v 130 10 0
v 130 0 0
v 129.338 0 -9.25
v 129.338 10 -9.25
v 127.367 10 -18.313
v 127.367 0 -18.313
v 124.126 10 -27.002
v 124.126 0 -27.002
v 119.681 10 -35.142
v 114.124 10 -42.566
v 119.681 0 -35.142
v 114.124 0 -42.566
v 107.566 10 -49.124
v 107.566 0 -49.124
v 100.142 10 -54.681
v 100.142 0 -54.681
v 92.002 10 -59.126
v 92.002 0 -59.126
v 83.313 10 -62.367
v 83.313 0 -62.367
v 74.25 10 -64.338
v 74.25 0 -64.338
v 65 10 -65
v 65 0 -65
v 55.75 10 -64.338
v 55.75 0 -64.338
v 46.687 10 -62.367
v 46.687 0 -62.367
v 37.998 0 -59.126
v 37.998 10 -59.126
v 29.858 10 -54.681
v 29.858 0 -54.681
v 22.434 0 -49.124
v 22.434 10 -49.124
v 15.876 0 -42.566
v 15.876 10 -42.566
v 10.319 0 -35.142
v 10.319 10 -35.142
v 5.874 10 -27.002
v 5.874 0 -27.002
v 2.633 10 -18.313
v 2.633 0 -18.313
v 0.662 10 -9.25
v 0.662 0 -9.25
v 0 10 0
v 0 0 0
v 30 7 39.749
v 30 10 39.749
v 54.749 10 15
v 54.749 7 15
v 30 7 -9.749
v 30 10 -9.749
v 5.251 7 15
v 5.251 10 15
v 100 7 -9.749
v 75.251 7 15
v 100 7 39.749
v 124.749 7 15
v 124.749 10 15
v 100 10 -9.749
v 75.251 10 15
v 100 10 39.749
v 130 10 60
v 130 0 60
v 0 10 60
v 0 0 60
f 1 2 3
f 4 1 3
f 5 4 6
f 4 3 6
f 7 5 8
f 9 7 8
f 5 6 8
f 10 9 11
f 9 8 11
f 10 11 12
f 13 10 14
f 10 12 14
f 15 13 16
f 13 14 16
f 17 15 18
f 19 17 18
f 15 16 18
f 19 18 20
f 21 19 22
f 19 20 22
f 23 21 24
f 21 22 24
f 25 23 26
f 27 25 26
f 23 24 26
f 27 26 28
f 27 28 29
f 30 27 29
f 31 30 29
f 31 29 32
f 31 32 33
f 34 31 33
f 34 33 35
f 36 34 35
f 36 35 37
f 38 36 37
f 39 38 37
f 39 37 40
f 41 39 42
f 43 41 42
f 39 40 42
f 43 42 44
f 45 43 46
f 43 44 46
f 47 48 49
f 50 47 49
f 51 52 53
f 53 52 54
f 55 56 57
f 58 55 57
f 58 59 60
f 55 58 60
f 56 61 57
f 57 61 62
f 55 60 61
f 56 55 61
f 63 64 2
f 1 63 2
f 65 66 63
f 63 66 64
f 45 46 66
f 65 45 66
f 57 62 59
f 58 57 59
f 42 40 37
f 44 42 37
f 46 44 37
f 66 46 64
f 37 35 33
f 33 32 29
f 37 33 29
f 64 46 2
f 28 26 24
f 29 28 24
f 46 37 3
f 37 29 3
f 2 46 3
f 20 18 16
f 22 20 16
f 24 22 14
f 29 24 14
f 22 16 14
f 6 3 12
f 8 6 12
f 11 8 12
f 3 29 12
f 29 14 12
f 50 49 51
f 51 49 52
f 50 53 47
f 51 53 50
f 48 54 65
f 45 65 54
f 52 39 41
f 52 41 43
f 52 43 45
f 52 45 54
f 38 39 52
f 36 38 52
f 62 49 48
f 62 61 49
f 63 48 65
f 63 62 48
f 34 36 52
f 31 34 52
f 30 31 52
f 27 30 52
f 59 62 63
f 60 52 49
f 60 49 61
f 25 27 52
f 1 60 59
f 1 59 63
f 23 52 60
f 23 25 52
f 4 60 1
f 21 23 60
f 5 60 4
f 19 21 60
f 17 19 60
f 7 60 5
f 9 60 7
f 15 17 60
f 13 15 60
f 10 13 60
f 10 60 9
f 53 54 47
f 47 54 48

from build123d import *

# Parameters (mm, degrees)
EXTRUDE_1_DEPTH     = 10
CUT_EXTRUDE_1_DEPTH = 3


with BuildPart() as part:
    # 草图1 → 凸台-拉伸1 (new body)
    with BuildSketch(Plane(origin=(0, 0, 0), x_dir=(1, 0, 0), z_dir=(0, 1, 0))):
        with BuildLine():
            Line((0, 0), (0, -60))
            Line((0, -60), (130, -60))
            Line((130, -60), (130, 0))
            ThreePointArc((130, 0), (65, 65), (0, 0))
        make_face()
    extrude(amount=EXTRUDE_1_DEPTH)

    # 草图2 → 切除-拉伸1 (cut)
    with BuildSketch(Plane(origin=(0, 10, 0), x_dir=(1, 0, 0), z_dir=(0, 1, 0))):
        Polygon((5.251262658, -15), (30, -39.748737342), (54.748737342, -15), (30, 9.748737342), align=None)
        Polygon((100, 9.748737342), (75.251262658, -15), (100, -39.748737342), (124.748737342, -15), align=None)
    extrude(amount=-CUT_EXTRUDE_1_DEPTH, mode=Mode.SUBTRACT)


solid = part.part
